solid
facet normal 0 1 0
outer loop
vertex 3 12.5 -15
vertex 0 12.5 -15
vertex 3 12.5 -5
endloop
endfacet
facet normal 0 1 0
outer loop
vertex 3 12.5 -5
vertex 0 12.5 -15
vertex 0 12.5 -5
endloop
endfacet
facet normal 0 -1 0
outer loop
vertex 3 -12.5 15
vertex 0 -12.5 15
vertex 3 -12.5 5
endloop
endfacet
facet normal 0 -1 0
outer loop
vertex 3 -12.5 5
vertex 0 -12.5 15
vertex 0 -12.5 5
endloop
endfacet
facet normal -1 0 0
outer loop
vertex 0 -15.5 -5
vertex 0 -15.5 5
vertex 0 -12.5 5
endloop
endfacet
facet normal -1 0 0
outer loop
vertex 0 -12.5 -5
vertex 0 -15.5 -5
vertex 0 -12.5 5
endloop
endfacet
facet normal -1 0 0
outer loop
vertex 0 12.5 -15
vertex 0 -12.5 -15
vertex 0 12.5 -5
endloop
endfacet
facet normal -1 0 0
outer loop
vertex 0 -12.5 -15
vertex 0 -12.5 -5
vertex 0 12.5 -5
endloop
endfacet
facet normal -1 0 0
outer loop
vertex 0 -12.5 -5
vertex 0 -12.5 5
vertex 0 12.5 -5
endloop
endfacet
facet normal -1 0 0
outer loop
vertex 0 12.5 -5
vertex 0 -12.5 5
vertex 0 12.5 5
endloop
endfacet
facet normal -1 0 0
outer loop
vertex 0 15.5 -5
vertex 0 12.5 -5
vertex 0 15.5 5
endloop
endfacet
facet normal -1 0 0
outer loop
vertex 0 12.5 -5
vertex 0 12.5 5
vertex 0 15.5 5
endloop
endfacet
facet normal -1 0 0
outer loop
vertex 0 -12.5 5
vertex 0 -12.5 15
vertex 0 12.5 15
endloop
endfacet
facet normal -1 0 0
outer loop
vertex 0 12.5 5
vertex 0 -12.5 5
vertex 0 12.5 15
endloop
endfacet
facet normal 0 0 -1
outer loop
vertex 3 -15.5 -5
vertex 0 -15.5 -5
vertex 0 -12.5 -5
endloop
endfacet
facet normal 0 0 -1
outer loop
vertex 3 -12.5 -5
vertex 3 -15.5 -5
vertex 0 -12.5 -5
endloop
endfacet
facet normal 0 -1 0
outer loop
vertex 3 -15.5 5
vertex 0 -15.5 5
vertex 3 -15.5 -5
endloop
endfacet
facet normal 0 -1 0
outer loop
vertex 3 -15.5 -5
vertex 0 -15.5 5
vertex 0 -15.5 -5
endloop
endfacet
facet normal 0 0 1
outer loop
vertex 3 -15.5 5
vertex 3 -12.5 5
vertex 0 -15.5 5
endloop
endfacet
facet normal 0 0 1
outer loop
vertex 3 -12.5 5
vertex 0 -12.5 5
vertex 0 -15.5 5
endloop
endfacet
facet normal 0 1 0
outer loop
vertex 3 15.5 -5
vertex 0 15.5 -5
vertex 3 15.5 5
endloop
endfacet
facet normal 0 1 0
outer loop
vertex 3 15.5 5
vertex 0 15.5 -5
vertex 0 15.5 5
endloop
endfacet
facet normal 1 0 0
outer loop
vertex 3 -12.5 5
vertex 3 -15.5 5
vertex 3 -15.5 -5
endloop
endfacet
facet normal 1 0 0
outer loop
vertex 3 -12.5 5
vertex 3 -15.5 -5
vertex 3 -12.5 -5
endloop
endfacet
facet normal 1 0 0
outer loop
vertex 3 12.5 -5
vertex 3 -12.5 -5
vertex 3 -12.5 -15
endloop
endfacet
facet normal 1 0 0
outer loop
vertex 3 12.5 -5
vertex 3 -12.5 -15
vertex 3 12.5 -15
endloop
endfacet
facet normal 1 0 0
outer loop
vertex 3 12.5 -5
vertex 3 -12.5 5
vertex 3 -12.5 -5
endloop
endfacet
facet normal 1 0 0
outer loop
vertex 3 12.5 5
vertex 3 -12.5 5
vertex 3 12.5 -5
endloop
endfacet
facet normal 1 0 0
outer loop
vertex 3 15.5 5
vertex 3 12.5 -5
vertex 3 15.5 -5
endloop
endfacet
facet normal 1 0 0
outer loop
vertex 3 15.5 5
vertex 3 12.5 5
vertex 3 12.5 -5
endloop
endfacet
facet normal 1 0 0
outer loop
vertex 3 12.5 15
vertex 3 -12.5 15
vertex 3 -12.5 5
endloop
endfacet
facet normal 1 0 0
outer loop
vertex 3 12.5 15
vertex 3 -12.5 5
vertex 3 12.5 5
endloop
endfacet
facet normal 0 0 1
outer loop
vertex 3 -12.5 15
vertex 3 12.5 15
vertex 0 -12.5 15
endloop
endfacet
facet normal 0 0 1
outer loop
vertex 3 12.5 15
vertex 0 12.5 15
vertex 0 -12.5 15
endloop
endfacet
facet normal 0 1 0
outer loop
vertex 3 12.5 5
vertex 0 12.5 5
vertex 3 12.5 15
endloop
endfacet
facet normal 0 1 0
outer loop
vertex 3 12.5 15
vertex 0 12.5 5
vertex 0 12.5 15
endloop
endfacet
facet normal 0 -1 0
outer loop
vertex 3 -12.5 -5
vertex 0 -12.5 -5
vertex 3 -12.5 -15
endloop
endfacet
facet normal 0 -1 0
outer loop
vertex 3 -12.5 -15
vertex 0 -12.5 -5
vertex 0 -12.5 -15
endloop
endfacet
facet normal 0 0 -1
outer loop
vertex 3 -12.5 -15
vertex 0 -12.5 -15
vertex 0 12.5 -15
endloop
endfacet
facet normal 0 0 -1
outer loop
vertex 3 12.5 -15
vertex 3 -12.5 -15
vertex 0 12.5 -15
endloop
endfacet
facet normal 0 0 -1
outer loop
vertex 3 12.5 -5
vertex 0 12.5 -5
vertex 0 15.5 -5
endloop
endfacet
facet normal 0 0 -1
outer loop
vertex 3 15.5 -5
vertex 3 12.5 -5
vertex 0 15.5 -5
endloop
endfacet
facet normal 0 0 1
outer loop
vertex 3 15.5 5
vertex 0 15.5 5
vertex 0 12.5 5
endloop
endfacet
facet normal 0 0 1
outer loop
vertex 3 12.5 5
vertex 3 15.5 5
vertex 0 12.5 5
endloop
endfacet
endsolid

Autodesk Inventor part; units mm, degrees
ref_plane "YZ Plane" through (0, 0, 0) normal (1, 0, 0) x (0, 1, 0)
ref_plane "XZ Plane" through (0, 0, 0) normal (0, 1, 0) x (-1, 0, 0)
ref_plane "XY Plane" through (0, 0, 0) normal (0, 0, 1) x (1, 0, 0)
sketch "Boceto1" plane through (0, 0, 0) normal (1, 0, 0) x (0, 1, 0)
  line L0 (-12.5, 15) -> (-12.5, 5)
  line L1 (-12.5, 5) -> (-15.5, 5)
  line L2 (-15.5, 5) -> (-15.5, -5)
  line L3 (-15.5, -5) -> (-12.5, -5)
  line L4 (-12.5, -5) -> (-12.5, -15)
  line L5 (-12.5, -15) -> (12.5, -15)
  line L6 (12.5, -15) -> (12.5, -5)
  line L7 (12.5, -5) -> (15.5, -5)
  line L8 (15.5, -5) -> (15.5, 5)
  line L9 (15.5, 5) -> (12.5, 5)
  line L10 (12.5, 5) -> (12.5, 15)
  line L11 (12.5, 15) -> (-12.5, 15)
  point P0 (0, 0)
extrude "Extrusión1" add sketch "Boceto1" along normal blind 3
properties part number "Battery_Wall1" material "MDF Tablero de fibras de densidad media"
